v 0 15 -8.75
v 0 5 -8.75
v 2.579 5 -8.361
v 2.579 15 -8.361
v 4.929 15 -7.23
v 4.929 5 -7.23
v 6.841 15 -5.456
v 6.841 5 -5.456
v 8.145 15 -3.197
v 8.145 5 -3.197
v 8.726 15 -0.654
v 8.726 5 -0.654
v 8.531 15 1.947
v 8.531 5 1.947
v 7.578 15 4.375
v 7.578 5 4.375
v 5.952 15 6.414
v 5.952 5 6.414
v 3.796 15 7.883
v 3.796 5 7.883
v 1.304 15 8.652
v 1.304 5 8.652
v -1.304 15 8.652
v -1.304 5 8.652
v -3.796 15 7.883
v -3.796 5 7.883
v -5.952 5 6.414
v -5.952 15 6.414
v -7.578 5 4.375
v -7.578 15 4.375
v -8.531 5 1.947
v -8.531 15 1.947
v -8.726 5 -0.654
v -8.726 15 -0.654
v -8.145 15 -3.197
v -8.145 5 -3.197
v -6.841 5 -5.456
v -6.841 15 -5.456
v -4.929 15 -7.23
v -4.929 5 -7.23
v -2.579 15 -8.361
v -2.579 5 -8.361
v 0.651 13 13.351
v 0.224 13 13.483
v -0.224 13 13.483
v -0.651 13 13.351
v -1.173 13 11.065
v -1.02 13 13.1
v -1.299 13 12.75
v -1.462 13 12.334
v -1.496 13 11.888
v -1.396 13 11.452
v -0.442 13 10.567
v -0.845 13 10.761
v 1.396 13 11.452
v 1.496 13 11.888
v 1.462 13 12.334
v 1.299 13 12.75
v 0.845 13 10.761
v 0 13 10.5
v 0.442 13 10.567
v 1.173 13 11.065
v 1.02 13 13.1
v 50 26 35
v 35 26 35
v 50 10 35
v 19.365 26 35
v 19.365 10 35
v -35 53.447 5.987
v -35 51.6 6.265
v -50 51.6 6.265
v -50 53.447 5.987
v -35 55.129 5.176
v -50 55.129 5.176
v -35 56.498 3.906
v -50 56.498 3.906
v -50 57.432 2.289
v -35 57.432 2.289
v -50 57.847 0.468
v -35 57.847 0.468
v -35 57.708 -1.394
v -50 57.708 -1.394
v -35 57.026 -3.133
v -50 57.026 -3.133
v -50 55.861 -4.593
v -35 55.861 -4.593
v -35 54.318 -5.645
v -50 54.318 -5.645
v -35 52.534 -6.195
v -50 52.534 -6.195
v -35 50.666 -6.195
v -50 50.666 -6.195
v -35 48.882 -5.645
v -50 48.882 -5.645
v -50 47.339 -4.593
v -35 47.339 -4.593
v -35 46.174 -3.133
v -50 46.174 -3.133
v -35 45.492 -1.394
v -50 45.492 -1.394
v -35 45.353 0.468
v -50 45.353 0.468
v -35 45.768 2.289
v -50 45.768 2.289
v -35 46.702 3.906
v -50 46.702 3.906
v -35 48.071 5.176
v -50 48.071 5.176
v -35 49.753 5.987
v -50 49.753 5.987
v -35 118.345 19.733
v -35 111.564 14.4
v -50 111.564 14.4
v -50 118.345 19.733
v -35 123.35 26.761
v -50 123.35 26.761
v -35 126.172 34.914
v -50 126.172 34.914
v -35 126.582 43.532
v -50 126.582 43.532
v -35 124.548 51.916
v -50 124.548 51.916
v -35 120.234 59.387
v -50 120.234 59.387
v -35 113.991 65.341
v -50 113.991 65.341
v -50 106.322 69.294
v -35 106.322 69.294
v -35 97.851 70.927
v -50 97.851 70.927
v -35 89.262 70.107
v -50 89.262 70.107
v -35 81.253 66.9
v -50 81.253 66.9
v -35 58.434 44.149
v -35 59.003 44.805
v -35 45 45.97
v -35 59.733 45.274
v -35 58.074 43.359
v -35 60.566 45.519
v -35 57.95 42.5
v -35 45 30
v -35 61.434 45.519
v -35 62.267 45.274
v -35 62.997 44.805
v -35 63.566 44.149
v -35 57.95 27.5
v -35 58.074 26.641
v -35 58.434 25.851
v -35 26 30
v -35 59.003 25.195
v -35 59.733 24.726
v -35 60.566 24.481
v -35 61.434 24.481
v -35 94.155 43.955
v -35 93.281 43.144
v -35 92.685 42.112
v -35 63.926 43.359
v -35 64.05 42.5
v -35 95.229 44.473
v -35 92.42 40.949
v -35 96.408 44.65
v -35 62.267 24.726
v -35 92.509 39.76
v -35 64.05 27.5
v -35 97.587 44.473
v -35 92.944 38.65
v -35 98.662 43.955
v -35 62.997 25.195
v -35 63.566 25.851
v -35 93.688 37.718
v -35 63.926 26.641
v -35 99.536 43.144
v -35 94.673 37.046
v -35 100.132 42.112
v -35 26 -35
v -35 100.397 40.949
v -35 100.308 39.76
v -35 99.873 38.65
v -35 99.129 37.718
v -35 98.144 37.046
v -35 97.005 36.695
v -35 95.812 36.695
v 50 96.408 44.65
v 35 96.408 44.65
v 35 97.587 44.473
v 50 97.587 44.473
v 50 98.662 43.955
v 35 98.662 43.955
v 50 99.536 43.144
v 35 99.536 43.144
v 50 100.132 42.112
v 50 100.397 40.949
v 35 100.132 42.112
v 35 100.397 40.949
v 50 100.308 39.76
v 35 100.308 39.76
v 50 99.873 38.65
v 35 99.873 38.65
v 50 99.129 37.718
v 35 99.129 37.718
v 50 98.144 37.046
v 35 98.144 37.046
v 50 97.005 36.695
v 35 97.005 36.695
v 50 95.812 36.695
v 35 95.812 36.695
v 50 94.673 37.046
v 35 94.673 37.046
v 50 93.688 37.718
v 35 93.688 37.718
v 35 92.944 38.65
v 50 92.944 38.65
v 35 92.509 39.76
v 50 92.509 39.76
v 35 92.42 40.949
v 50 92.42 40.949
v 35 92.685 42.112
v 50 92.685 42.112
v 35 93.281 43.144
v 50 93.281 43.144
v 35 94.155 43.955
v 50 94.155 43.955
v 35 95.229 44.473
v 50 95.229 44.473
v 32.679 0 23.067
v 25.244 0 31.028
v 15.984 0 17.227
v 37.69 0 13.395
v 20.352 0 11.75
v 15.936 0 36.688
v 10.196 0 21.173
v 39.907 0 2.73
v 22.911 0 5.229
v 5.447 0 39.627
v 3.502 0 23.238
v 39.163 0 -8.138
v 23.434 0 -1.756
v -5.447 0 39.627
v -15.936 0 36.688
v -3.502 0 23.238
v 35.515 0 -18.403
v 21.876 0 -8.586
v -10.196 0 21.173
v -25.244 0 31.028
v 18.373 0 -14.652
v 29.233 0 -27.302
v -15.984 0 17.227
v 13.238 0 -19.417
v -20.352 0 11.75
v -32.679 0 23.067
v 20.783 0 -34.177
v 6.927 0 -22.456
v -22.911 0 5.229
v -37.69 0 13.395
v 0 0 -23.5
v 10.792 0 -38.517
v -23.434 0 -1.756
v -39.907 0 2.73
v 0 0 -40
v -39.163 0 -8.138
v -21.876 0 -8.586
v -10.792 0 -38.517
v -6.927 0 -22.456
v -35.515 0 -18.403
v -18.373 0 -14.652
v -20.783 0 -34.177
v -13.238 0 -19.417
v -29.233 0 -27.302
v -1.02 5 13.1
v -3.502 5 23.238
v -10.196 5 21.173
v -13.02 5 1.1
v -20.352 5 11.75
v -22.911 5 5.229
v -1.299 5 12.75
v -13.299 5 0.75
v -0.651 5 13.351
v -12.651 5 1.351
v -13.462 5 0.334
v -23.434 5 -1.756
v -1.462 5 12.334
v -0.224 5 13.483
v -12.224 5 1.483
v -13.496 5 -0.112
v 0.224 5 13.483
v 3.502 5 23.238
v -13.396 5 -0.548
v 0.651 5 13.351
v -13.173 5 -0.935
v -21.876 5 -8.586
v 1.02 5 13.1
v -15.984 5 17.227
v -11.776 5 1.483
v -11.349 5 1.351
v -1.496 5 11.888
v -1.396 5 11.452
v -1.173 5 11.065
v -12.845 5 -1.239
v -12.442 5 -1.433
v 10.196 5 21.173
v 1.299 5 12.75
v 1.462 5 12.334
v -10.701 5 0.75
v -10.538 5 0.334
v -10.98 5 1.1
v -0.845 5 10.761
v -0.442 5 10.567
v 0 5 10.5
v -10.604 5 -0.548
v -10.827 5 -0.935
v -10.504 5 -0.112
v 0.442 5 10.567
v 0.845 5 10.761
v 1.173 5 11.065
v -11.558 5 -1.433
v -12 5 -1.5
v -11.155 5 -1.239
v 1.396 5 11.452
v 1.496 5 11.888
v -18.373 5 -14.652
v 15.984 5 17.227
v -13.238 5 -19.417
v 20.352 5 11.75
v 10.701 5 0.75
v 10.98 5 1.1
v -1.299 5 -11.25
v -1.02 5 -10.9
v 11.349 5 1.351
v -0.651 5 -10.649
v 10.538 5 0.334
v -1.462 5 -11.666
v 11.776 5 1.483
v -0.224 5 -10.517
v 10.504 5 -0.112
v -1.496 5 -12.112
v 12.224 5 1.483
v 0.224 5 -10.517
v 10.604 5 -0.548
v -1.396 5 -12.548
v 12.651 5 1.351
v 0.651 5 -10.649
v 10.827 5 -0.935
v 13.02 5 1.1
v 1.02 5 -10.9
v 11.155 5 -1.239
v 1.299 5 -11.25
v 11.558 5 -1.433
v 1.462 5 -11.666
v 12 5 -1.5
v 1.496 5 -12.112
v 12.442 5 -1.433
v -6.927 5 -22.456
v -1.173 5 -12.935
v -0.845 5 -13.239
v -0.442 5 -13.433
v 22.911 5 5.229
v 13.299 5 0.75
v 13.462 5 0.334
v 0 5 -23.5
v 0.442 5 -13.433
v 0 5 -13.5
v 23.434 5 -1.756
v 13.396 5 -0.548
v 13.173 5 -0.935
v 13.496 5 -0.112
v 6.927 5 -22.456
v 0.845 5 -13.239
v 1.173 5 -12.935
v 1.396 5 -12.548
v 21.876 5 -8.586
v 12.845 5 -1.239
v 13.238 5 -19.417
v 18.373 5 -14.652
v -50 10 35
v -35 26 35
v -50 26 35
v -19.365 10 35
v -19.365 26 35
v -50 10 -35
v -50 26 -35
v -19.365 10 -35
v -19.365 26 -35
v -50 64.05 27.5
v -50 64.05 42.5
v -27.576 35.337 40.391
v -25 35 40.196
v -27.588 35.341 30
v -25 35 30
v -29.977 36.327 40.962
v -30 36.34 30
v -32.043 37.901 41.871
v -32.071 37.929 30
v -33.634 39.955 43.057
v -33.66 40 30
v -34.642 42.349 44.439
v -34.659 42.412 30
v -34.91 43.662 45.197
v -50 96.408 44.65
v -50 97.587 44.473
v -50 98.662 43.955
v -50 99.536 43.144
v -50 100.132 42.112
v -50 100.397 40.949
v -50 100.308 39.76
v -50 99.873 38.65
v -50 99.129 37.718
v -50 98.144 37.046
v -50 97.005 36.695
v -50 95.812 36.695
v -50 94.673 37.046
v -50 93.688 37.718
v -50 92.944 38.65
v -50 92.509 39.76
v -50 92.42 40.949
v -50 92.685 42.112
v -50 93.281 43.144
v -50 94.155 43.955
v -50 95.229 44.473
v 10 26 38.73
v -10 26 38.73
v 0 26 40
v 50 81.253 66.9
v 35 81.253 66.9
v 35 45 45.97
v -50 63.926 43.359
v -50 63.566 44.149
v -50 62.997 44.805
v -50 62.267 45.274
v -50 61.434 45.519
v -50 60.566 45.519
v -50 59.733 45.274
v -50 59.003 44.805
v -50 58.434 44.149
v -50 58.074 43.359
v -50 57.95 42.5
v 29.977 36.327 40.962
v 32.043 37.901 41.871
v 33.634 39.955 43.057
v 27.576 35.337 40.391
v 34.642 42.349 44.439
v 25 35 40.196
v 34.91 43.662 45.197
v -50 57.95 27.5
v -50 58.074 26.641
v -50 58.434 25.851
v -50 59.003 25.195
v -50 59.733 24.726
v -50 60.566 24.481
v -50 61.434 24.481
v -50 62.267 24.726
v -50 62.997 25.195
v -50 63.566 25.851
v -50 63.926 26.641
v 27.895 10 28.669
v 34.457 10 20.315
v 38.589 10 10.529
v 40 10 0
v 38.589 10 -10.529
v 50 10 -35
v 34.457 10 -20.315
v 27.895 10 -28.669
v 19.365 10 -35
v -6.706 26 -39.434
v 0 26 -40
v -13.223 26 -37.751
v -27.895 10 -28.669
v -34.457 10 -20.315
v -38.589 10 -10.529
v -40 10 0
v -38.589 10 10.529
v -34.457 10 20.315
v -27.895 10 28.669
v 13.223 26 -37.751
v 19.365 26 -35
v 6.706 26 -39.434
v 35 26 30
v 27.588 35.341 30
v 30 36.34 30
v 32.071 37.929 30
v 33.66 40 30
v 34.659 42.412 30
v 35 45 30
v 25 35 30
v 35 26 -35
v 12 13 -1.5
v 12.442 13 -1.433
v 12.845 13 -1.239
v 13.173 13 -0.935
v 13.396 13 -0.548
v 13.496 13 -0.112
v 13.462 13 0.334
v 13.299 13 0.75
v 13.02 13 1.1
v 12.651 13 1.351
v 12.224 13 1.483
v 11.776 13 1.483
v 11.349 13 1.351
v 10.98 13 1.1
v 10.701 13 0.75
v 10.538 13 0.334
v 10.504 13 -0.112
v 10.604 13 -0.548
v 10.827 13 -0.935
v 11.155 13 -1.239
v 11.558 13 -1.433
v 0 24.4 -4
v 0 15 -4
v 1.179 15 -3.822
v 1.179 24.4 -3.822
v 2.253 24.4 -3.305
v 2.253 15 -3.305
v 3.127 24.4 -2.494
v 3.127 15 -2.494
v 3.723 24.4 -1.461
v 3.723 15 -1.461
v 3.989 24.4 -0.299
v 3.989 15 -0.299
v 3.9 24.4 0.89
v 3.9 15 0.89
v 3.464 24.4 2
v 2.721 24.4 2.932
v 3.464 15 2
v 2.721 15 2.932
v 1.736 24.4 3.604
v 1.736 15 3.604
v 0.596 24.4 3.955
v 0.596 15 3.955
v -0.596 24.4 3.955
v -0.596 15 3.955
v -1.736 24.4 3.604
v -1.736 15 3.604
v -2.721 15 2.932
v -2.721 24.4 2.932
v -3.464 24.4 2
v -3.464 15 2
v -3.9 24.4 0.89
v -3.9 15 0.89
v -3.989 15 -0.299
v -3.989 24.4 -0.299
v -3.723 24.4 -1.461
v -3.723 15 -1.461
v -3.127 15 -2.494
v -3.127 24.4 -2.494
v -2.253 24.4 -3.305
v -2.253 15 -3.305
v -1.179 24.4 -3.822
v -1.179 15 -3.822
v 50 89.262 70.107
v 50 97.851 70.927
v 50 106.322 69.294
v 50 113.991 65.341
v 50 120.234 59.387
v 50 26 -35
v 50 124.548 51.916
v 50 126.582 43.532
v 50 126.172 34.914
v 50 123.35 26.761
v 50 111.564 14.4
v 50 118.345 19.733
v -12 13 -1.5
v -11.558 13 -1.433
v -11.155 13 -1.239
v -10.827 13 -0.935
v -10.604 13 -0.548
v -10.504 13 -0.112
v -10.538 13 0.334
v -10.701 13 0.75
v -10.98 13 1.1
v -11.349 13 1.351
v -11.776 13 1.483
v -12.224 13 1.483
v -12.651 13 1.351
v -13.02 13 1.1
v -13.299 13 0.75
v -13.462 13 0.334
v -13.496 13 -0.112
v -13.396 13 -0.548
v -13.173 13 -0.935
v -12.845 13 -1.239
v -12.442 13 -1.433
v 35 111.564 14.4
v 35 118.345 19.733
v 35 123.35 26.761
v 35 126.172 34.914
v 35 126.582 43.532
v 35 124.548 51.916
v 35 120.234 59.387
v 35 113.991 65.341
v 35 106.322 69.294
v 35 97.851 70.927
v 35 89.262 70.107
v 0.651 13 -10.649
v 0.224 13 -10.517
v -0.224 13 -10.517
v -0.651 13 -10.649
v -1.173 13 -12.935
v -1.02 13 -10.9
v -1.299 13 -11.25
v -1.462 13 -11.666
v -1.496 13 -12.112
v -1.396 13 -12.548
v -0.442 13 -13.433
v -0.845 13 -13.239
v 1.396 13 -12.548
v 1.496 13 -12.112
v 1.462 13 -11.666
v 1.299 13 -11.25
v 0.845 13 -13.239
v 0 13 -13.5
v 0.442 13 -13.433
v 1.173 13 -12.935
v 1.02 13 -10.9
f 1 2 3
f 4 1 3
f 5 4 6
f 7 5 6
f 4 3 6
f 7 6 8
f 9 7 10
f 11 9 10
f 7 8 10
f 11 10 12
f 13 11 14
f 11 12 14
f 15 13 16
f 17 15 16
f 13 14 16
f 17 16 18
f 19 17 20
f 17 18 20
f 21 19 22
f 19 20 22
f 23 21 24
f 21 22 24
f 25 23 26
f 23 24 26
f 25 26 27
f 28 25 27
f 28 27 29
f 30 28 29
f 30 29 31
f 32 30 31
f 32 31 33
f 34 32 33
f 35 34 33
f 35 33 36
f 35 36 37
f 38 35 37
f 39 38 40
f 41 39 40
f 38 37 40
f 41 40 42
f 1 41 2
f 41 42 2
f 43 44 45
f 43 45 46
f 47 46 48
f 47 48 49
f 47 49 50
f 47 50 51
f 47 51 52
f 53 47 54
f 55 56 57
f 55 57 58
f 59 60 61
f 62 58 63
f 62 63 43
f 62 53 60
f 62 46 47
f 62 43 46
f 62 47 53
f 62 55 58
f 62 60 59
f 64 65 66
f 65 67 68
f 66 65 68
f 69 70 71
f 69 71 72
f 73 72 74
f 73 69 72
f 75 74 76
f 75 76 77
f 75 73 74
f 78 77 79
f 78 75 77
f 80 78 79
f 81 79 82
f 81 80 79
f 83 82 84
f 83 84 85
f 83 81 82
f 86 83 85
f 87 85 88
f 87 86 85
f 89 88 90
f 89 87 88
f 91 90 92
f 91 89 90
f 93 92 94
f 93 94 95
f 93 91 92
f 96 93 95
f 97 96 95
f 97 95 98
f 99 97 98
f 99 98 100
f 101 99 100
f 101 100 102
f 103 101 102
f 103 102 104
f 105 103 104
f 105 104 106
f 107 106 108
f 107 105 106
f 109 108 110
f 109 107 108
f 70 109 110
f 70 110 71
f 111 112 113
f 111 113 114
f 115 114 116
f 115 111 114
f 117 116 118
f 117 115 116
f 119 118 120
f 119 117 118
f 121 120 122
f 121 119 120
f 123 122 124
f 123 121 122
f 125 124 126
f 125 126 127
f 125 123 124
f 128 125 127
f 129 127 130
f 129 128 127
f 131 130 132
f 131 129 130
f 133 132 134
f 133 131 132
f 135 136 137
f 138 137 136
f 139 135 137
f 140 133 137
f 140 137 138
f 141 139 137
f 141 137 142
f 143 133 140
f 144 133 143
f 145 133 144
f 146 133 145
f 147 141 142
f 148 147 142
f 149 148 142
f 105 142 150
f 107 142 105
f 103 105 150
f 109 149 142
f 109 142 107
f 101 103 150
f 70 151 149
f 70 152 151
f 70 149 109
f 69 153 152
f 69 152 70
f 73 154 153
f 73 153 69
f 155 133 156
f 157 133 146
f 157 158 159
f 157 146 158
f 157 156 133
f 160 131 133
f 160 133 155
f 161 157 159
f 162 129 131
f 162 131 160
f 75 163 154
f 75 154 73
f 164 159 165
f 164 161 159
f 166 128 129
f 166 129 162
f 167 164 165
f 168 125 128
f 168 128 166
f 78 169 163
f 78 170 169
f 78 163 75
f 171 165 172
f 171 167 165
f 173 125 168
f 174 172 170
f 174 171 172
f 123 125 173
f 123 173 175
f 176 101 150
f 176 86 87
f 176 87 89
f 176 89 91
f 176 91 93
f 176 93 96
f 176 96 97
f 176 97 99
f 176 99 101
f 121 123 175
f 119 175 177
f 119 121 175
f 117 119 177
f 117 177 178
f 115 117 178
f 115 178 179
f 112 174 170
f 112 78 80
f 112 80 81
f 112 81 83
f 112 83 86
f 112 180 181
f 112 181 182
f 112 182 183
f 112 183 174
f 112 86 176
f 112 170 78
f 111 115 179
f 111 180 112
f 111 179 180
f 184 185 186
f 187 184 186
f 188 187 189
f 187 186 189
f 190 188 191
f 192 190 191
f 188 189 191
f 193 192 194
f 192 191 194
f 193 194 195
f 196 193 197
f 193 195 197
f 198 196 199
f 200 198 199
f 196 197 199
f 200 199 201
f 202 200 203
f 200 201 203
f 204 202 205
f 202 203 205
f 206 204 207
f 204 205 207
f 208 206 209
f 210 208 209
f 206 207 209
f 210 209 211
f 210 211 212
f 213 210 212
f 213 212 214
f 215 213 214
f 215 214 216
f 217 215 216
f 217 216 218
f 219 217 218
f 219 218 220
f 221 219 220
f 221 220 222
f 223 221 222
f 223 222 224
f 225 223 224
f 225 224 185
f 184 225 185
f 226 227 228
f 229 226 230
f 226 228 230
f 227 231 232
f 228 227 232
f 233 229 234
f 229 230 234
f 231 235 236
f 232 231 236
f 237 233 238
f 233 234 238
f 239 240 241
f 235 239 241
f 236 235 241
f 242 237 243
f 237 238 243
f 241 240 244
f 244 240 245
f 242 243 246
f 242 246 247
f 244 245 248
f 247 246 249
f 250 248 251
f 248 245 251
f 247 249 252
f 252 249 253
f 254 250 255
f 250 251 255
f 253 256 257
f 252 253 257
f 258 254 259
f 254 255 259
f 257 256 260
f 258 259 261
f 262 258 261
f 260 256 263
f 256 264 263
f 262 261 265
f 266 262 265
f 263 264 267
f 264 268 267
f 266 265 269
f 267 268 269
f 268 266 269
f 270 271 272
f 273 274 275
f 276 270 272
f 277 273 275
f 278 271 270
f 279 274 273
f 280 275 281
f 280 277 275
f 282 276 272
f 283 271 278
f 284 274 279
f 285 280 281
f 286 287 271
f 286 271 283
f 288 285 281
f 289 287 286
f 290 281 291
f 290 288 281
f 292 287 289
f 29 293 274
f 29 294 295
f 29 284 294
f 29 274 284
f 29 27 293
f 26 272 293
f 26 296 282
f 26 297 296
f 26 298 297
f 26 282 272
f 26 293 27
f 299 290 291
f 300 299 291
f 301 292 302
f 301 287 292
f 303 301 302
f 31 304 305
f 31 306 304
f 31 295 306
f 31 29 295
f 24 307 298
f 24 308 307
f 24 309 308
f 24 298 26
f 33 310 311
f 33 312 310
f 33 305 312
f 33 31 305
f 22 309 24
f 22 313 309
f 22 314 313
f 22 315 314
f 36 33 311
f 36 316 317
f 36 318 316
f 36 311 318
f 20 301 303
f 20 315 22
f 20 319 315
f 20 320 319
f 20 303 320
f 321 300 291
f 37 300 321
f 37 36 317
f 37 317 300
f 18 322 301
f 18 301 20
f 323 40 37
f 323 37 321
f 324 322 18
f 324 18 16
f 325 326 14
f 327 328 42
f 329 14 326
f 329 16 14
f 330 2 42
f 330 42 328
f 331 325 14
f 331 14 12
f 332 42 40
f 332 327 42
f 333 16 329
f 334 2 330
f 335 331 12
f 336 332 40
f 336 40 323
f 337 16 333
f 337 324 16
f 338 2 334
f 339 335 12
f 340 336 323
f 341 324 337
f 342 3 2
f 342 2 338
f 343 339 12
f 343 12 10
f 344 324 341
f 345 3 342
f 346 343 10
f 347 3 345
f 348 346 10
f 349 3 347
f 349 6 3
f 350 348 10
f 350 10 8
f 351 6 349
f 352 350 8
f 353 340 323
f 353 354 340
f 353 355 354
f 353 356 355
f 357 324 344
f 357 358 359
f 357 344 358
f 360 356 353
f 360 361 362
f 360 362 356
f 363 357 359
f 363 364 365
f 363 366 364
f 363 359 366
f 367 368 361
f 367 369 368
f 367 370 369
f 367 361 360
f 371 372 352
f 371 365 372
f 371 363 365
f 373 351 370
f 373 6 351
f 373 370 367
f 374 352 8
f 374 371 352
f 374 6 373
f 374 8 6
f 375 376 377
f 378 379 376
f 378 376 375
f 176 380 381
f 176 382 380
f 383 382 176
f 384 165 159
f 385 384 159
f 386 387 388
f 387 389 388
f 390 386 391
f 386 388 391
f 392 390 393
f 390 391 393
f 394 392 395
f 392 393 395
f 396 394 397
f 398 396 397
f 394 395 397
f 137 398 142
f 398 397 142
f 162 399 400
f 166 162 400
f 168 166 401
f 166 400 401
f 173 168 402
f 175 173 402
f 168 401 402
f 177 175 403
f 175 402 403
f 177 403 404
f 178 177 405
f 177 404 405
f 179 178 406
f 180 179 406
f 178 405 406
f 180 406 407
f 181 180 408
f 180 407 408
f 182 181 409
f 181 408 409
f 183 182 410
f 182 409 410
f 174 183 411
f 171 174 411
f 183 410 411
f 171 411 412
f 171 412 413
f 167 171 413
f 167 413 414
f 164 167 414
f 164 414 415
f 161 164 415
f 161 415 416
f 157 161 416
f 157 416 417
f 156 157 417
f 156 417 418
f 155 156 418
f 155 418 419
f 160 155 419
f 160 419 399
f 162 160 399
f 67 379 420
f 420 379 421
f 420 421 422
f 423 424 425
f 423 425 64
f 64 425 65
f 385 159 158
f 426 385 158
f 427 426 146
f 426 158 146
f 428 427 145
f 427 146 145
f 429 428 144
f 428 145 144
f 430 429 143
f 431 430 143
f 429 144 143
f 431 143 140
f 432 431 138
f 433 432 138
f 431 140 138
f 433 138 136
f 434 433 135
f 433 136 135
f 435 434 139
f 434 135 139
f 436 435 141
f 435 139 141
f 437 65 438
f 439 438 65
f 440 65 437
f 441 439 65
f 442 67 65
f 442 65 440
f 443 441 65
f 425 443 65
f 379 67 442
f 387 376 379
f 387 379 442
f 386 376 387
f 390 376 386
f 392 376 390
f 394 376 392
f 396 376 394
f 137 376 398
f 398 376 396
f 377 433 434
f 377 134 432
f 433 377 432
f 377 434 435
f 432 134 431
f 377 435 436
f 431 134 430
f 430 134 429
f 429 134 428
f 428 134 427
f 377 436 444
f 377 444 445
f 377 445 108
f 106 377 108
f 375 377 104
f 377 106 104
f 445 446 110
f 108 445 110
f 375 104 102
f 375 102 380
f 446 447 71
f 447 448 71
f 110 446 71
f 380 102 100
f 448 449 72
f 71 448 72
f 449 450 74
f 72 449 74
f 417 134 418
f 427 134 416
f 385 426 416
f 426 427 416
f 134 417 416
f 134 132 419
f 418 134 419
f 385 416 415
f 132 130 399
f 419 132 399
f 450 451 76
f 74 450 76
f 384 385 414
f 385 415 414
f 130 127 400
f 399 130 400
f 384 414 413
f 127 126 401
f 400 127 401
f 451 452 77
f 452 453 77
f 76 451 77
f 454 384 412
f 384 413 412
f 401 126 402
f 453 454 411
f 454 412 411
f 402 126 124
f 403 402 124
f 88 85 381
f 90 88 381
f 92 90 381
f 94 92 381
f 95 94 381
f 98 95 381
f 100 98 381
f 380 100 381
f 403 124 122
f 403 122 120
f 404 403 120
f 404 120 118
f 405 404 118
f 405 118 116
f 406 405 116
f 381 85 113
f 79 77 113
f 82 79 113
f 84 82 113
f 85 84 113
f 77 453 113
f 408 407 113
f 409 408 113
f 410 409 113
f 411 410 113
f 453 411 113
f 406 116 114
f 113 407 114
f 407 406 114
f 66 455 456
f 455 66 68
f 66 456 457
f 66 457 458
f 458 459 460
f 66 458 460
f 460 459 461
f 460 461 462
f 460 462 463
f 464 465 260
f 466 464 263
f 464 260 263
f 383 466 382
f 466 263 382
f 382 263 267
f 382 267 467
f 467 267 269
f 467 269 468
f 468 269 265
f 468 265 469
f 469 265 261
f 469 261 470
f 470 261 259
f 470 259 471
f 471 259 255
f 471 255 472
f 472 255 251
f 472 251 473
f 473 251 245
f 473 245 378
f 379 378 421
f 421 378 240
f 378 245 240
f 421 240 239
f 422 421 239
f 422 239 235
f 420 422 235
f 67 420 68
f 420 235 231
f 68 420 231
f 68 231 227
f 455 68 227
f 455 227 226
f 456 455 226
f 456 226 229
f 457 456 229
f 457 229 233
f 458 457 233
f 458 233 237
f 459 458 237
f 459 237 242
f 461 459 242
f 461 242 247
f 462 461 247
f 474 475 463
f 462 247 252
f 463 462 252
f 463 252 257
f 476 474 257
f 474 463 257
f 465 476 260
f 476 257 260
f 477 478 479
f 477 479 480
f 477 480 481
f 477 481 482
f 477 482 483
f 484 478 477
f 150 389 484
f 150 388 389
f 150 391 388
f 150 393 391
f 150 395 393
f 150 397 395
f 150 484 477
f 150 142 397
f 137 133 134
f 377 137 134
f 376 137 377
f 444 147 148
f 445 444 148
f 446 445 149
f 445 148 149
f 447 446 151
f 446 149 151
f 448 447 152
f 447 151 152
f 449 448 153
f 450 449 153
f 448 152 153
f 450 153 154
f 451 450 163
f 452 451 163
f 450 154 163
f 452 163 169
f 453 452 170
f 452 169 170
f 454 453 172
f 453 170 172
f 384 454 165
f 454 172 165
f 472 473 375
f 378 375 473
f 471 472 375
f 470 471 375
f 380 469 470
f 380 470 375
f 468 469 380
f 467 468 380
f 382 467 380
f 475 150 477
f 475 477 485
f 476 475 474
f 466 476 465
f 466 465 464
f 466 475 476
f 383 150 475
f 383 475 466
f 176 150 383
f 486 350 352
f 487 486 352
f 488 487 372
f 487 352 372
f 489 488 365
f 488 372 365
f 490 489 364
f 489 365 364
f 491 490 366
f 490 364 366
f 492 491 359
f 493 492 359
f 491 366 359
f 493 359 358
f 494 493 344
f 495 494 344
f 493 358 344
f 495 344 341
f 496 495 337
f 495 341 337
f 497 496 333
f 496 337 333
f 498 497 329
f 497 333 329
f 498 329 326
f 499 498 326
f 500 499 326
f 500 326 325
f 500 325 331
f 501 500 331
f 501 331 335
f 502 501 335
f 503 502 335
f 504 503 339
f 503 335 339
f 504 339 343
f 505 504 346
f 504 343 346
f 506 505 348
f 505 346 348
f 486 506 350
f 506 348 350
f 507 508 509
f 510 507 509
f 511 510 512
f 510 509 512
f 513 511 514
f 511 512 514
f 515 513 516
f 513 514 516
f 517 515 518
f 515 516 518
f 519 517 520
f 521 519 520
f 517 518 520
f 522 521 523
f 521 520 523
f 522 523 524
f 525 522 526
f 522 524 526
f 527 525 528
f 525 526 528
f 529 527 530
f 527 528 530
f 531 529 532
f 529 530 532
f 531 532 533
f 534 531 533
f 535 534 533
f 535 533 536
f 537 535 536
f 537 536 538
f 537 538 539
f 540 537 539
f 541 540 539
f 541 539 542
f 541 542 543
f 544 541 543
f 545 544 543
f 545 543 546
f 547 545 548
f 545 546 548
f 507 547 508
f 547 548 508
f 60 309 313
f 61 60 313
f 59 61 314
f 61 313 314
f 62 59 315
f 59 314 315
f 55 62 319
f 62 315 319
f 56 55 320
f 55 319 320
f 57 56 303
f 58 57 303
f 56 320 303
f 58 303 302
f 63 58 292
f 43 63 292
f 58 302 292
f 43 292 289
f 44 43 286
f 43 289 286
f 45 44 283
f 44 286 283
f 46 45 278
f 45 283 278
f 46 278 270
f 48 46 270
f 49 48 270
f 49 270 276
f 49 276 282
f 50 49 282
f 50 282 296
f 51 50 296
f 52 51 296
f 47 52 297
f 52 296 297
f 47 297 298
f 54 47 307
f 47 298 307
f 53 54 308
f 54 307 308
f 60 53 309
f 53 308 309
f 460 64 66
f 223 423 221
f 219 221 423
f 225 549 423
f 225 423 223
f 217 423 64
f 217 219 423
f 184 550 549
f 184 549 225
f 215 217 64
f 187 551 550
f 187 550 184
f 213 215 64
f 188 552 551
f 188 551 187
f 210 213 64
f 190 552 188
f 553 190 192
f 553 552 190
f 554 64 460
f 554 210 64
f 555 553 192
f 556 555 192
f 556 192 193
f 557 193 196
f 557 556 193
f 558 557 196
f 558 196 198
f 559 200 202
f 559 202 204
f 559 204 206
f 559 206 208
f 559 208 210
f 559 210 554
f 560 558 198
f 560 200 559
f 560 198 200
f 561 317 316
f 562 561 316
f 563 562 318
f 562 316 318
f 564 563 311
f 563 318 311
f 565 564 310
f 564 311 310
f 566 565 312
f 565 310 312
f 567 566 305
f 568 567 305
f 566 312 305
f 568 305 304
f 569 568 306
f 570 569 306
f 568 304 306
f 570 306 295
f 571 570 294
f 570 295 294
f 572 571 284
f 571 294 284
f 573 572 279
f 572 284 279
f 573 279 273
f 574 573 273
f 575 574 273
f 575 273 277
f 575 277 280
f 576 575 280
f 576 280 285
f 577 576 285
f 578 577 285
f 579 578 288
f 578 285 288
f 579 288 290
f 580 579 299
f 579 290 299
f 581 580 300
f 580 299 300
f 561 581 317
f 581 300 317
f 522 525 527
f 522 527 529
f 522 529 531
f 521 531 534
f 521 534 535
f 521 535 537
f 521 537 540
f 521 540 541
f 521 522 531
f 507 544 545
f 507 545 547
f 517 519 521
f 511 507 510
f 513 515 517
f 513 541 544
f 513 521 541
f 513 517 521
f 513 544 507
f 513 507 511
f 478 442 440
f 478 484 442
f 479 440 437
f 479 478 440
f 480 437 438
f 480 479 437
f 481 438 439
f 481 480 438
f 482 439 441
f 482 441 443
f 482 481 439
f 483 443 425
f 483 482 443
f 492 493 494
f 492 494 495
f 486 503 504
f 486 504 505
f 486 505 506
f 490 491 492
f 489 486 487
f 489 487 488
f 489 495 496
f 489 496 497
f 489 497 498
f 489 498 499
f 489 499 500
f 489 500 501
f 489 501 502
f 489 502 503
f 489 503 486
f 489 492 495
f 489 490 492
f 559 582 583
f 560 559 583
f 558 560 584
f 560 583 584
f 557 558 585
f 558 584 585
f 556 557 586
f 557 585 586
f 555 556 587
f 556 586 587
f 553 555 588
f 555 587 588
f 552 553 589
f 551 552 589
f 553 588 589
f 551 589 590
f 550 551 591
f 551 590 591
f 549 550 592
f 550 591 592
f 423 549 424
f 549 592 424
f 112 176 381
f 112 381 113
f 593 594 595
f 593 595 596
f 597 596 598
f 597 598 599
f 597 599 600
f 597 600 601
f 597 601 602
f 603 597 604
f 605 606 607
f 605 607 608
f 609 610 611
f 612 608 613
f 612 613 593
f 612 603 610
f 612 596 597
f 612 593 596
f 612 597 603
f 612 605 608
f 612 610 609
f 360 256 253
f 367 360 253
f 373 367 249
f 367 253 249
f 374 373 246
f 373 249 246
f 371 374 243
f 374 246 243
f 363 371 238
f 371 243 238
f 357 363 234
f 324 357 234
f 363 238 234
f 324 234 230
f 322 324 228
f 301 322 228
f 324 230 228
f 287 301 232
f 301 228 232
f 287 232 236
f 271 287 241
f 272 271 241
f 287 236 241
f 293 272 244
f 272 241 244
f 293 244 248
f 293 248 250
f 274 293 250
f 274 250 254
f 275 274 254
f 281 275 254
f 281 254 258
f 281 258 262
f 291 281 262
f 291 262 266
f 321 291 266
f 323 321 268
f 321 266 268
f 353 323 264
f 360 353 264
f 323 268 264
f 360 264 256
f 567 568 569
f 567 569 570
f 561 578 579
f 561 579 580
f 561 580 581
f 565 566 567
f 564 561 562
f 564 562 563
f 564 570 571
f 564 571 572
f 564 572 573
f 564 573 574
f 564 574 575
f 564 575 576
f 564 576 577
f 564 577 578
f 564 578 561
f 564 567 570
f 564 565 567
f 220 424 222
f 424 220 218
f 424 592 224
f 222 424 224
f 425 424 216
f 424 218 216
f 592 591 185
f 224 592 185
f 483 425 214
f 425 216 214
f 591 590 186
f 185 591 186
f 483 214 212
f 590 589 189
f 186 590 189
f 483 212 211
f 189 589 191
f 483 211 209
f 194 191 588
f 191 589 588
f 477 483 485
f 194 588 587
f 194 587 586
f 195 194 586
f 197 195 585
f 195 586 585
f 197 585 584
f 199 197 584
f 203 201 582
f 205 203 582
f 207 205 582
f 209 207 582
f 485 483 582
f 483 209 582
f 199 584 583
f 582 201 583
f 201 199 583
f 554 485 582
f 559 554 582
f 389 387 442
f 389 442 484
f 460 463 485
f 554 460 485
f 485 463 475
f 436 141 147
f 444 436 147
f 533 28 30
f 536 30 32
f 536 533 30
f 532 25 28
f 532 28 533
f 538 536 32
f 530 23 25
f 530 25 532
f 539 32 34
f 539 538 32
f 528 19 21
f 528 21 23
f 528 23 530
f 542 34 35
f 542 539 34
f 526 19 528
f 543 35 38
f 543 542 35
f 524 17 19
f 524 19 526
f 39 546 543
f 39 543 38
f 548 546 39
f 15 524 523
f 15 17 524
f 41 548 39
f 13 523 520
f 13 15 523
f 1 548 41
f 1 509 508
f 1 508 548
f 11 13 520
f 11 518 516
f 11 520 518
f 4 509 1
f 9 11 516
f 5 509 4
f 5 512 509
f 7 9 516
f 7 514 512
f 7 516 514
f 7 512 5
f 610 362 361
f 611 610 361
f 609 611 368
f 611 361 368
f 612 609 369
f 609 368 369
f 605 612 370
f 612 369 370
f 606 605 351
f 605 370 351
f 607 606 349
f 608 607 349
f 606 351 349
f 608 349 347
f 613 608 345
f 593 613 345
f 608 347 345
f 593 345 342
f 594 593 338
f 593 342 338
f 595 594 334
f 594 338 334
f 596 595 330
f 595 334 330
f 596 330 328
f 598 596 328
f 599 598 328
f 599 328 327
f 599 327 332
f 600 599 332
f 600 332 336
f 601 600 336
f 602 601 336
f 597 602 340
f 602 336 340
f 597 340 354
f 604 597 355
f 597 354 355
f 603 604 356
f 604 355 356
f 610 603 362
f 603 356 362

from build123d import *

# Parameters (mm, degrees)
SKETCH1_R                = 40
BOSS_EXTRUDE2_DEPTH      = 26
SKETCH3_R                = 23.5
CUT_EXTRUDE1_DEPTH       = 5
BOSS_EXTRUDE4_DEPTH      = 35
BOSS_EXTRUDE4_DEPTH_BACK = 35
SKETCH7_W                = 70
SKETCH7_H                = 16
SKETCH5_R                = 8.75
CUT_EXTRUDE9_DEPTH       = 10
SKETCH10_R               = 4
CUT_EXTRUDE10_DEPTH      = 9.4
SKETCH16_R               = 6.265
BOSS_EXTRUDE5_DEPTH      = 15
SKETCH18_R               = 4
CUT_EXTRUDE12_DEPTH      = 177.33290572
BOSS_EXTRUDE9_REACH      = 170.28
FILLET4_R                = 10
FILLET5_R                = 10
SKETCH4_R                = 1.5
CUT_EXTRUDE15_DEPTH      = 8
SKETCH25_R               = 6.265
BOSS_EXTRUDE10_DEPTH     = 15
BOSS_EXTRUDE11_DEPTH     = 15


with BuildPart() as part:
    # Sketch1 → Boss-Extrude2 (new body)
    with BuildSketch(Plane(origin=(0, 0, 0), x_dir=(1, 0, 0), z_dir=(0, 1, 0))):
        Circle(SKETCH1_R)
    extrude(amount=BOSS_EXTRUDE2_DEPTH)

    # Sketch3 → Cut-Extrude1 (cut)
    with BuildSketch(Plane.XZ):
        Circle(SKETCH3_R)
    extrude(amount=-CUT_EXTRUDE1_DEPTH, mode=Mode.SUBTRACT)

    # Sketch7 → Boss-Extrude4 (add, two sides: drawn at the far end of the back side and taken through both)
    with BuildSketch(Plane(origin=(0, 0, 0), x_dir=(0, 0, -1), z_dir=(1, 0, 0)).offset(-BOSS_EXTRUDE4_DEPTH_BACK)):
        with Locations((0, 18)):
            Rectangle(SKETCH7_W, SKETCH7_H)
    extrude(amount=BOSS_EXTRUDE4_DEPTH + BOSS_EXTRUDE4_DEPTH_BACK)

    # Sketch5 → Cut-Extrude9 (cut)
    with BuildSketch(Plane.XZ.offset(-5)):
        Circle(SKETCH5_R)
    extrude(amount=-CUT_EXTRUDE9_DEPTH, mode=Mode.SUBTRACT)

    # Sketch10 → Cut-Extrude10 (cut)
    with BuildSketch(Plane.XZ.offset(-15)):
        Circle(SKETCH10_R)
    extrude(amount=-CUT_EXTRUDE10_DEPTH, mode=Mode.SUBTRACT)

    # Sketch16 → Boss-Extrude5 (add)
    with BuildSketch(Plane.ZY.offset(35)):
        with BuildLine():
            Line((-35, 10), (-35, 26))
            Line((-35, 26), (14.400349673, 111.563915545))
            ThreePointArc((14.400349673, 111.563915545), (55.805794239, 122.658470979), (66.900349673, 81.253026413))
            Line((66.900349673, 81.253026413), (35, 26))
            Line((35, 26), (35, 10))
            Line((35, 10), (-35, 10))
        make_face()
        with Locations((0, 51.6)):
            Circle(SKETCH16_R, mode=Mode.SUBTRACT)
        with BuildLine():
            Line((27.5, 64.05), (42.5, 64.05))
            ThreePointArc((42.5, 64.05), (45.55, 61), (42.5, 57.95))
            Line((42.5, 57.95), (27.5, 57.95))
            ThreePointArc((27.5, 57.95), (24.45, 61), (27.5, 64.05))
        make_face(mode=Mode.SUBTRACT)
    boss_extrude5 = extrude(amount=BOSS_EXTRUDE5_DEPTH)

    # Mirror1: Boss-Extrude5 across plane
    add(boss_extrude5.mirror(Plane(origin=(0, 0, 0), x_dir=(0, 0, 1), z_dir=(1, 0, 0))))

    # Sketch18 → Cut-Extrude12 (cut, through all)
    with BuildSketch(Plane.ZY.offset(50)):
        with Locations((40.650349673, 96.408470979)):
            Circle(SKETCH18_R)
    extrude(amount=-CUT_EXTRUDE12_DEPTH, mode=Mode.SUBTRACT)

    # Sketch24 → Boss-Extrude9 (add, up to next)
    with BuildSketch(Plane(origin=(-35, 0, 0), x_dir=(0, 0, -1), z_dir=(1, 0, 0)), mode=Mode.PRIVATE) as boss_extrude9_sk1:
        Polygon((-40.196152423, 35), (-30, 35), (-30, 26), (-35, 26), align=None)
    boss_extrude9_tool1 = extrude(boss_extrude9_sk1.sketch, amount=BOSS_EXTRUDE9_REACH, mode=Mode.PRIVATE) - part.part
    add(boss_extrude9_tool1.solids().sort_by_distance((-35, 31.012908, 33.947102))[0])

    # Fillet4
    fillet4_edges = [part.edges().sort_by_distance(p)[0] for p in [
        (-35, 35, 35.098076211),
    ]]
    fillet(fillet4_edges, radius=FILLET4_R)

    # Fillet5
    fillet5_edges = [part.edges().sort_by_distance(p)[0] for p in [
        (35, 35, 35.098076211),
    ]]
    fillet(fillet5_edges, radius=FILLET5_R)

    # Sketch4 → Cut-Extrude15 (cut)
    with BuildSketch(Plane.XZ.offset(-5)):
        with Locations((12, 0)):
            Circle(SKETCH4_R)
        with Locations((0, -12)):
            Circle(SKETCH4_R)
        with Locations((-12, 0)):
            Circle(SKETCH4_R)
        with Locations((0, 12)):
            Circle(SKETCH4_R)
    extrude(amount=-CUT_EXTRUDE15_DEPTH, mode=Mode.SUBTRACT)

    # Sketch25 → Boss-Extrude10 (add)
    with BuildSketch(Plane.ZY.offset(-35)):
        with Locations((0, 51.6)):
            Circle(SKETCH25_R)
    extrude(amount=-BOSS_EXTRUDE10_DEPTH)

    # Sketch26 → Boss-Extrude11 (add)
    with BuildSketch(Plane.ZY.offset(-35)):
        with BuildLine():
            Line((27.5, 64.05), (42.5, 64.05))
            ThreePointArc((42.5, 64.05), (45.55, 61), (42.5, 57.95))
            Line((42.5, 57.95), (27.5, 57.95))
            ThreePointArc((27.5, 57.95), (24.45, 61), (27.5, 64.05))
        make_face()
    extrude(amount=-BOSS_EXTRUDE11_DEPTH)


solid = part.part
